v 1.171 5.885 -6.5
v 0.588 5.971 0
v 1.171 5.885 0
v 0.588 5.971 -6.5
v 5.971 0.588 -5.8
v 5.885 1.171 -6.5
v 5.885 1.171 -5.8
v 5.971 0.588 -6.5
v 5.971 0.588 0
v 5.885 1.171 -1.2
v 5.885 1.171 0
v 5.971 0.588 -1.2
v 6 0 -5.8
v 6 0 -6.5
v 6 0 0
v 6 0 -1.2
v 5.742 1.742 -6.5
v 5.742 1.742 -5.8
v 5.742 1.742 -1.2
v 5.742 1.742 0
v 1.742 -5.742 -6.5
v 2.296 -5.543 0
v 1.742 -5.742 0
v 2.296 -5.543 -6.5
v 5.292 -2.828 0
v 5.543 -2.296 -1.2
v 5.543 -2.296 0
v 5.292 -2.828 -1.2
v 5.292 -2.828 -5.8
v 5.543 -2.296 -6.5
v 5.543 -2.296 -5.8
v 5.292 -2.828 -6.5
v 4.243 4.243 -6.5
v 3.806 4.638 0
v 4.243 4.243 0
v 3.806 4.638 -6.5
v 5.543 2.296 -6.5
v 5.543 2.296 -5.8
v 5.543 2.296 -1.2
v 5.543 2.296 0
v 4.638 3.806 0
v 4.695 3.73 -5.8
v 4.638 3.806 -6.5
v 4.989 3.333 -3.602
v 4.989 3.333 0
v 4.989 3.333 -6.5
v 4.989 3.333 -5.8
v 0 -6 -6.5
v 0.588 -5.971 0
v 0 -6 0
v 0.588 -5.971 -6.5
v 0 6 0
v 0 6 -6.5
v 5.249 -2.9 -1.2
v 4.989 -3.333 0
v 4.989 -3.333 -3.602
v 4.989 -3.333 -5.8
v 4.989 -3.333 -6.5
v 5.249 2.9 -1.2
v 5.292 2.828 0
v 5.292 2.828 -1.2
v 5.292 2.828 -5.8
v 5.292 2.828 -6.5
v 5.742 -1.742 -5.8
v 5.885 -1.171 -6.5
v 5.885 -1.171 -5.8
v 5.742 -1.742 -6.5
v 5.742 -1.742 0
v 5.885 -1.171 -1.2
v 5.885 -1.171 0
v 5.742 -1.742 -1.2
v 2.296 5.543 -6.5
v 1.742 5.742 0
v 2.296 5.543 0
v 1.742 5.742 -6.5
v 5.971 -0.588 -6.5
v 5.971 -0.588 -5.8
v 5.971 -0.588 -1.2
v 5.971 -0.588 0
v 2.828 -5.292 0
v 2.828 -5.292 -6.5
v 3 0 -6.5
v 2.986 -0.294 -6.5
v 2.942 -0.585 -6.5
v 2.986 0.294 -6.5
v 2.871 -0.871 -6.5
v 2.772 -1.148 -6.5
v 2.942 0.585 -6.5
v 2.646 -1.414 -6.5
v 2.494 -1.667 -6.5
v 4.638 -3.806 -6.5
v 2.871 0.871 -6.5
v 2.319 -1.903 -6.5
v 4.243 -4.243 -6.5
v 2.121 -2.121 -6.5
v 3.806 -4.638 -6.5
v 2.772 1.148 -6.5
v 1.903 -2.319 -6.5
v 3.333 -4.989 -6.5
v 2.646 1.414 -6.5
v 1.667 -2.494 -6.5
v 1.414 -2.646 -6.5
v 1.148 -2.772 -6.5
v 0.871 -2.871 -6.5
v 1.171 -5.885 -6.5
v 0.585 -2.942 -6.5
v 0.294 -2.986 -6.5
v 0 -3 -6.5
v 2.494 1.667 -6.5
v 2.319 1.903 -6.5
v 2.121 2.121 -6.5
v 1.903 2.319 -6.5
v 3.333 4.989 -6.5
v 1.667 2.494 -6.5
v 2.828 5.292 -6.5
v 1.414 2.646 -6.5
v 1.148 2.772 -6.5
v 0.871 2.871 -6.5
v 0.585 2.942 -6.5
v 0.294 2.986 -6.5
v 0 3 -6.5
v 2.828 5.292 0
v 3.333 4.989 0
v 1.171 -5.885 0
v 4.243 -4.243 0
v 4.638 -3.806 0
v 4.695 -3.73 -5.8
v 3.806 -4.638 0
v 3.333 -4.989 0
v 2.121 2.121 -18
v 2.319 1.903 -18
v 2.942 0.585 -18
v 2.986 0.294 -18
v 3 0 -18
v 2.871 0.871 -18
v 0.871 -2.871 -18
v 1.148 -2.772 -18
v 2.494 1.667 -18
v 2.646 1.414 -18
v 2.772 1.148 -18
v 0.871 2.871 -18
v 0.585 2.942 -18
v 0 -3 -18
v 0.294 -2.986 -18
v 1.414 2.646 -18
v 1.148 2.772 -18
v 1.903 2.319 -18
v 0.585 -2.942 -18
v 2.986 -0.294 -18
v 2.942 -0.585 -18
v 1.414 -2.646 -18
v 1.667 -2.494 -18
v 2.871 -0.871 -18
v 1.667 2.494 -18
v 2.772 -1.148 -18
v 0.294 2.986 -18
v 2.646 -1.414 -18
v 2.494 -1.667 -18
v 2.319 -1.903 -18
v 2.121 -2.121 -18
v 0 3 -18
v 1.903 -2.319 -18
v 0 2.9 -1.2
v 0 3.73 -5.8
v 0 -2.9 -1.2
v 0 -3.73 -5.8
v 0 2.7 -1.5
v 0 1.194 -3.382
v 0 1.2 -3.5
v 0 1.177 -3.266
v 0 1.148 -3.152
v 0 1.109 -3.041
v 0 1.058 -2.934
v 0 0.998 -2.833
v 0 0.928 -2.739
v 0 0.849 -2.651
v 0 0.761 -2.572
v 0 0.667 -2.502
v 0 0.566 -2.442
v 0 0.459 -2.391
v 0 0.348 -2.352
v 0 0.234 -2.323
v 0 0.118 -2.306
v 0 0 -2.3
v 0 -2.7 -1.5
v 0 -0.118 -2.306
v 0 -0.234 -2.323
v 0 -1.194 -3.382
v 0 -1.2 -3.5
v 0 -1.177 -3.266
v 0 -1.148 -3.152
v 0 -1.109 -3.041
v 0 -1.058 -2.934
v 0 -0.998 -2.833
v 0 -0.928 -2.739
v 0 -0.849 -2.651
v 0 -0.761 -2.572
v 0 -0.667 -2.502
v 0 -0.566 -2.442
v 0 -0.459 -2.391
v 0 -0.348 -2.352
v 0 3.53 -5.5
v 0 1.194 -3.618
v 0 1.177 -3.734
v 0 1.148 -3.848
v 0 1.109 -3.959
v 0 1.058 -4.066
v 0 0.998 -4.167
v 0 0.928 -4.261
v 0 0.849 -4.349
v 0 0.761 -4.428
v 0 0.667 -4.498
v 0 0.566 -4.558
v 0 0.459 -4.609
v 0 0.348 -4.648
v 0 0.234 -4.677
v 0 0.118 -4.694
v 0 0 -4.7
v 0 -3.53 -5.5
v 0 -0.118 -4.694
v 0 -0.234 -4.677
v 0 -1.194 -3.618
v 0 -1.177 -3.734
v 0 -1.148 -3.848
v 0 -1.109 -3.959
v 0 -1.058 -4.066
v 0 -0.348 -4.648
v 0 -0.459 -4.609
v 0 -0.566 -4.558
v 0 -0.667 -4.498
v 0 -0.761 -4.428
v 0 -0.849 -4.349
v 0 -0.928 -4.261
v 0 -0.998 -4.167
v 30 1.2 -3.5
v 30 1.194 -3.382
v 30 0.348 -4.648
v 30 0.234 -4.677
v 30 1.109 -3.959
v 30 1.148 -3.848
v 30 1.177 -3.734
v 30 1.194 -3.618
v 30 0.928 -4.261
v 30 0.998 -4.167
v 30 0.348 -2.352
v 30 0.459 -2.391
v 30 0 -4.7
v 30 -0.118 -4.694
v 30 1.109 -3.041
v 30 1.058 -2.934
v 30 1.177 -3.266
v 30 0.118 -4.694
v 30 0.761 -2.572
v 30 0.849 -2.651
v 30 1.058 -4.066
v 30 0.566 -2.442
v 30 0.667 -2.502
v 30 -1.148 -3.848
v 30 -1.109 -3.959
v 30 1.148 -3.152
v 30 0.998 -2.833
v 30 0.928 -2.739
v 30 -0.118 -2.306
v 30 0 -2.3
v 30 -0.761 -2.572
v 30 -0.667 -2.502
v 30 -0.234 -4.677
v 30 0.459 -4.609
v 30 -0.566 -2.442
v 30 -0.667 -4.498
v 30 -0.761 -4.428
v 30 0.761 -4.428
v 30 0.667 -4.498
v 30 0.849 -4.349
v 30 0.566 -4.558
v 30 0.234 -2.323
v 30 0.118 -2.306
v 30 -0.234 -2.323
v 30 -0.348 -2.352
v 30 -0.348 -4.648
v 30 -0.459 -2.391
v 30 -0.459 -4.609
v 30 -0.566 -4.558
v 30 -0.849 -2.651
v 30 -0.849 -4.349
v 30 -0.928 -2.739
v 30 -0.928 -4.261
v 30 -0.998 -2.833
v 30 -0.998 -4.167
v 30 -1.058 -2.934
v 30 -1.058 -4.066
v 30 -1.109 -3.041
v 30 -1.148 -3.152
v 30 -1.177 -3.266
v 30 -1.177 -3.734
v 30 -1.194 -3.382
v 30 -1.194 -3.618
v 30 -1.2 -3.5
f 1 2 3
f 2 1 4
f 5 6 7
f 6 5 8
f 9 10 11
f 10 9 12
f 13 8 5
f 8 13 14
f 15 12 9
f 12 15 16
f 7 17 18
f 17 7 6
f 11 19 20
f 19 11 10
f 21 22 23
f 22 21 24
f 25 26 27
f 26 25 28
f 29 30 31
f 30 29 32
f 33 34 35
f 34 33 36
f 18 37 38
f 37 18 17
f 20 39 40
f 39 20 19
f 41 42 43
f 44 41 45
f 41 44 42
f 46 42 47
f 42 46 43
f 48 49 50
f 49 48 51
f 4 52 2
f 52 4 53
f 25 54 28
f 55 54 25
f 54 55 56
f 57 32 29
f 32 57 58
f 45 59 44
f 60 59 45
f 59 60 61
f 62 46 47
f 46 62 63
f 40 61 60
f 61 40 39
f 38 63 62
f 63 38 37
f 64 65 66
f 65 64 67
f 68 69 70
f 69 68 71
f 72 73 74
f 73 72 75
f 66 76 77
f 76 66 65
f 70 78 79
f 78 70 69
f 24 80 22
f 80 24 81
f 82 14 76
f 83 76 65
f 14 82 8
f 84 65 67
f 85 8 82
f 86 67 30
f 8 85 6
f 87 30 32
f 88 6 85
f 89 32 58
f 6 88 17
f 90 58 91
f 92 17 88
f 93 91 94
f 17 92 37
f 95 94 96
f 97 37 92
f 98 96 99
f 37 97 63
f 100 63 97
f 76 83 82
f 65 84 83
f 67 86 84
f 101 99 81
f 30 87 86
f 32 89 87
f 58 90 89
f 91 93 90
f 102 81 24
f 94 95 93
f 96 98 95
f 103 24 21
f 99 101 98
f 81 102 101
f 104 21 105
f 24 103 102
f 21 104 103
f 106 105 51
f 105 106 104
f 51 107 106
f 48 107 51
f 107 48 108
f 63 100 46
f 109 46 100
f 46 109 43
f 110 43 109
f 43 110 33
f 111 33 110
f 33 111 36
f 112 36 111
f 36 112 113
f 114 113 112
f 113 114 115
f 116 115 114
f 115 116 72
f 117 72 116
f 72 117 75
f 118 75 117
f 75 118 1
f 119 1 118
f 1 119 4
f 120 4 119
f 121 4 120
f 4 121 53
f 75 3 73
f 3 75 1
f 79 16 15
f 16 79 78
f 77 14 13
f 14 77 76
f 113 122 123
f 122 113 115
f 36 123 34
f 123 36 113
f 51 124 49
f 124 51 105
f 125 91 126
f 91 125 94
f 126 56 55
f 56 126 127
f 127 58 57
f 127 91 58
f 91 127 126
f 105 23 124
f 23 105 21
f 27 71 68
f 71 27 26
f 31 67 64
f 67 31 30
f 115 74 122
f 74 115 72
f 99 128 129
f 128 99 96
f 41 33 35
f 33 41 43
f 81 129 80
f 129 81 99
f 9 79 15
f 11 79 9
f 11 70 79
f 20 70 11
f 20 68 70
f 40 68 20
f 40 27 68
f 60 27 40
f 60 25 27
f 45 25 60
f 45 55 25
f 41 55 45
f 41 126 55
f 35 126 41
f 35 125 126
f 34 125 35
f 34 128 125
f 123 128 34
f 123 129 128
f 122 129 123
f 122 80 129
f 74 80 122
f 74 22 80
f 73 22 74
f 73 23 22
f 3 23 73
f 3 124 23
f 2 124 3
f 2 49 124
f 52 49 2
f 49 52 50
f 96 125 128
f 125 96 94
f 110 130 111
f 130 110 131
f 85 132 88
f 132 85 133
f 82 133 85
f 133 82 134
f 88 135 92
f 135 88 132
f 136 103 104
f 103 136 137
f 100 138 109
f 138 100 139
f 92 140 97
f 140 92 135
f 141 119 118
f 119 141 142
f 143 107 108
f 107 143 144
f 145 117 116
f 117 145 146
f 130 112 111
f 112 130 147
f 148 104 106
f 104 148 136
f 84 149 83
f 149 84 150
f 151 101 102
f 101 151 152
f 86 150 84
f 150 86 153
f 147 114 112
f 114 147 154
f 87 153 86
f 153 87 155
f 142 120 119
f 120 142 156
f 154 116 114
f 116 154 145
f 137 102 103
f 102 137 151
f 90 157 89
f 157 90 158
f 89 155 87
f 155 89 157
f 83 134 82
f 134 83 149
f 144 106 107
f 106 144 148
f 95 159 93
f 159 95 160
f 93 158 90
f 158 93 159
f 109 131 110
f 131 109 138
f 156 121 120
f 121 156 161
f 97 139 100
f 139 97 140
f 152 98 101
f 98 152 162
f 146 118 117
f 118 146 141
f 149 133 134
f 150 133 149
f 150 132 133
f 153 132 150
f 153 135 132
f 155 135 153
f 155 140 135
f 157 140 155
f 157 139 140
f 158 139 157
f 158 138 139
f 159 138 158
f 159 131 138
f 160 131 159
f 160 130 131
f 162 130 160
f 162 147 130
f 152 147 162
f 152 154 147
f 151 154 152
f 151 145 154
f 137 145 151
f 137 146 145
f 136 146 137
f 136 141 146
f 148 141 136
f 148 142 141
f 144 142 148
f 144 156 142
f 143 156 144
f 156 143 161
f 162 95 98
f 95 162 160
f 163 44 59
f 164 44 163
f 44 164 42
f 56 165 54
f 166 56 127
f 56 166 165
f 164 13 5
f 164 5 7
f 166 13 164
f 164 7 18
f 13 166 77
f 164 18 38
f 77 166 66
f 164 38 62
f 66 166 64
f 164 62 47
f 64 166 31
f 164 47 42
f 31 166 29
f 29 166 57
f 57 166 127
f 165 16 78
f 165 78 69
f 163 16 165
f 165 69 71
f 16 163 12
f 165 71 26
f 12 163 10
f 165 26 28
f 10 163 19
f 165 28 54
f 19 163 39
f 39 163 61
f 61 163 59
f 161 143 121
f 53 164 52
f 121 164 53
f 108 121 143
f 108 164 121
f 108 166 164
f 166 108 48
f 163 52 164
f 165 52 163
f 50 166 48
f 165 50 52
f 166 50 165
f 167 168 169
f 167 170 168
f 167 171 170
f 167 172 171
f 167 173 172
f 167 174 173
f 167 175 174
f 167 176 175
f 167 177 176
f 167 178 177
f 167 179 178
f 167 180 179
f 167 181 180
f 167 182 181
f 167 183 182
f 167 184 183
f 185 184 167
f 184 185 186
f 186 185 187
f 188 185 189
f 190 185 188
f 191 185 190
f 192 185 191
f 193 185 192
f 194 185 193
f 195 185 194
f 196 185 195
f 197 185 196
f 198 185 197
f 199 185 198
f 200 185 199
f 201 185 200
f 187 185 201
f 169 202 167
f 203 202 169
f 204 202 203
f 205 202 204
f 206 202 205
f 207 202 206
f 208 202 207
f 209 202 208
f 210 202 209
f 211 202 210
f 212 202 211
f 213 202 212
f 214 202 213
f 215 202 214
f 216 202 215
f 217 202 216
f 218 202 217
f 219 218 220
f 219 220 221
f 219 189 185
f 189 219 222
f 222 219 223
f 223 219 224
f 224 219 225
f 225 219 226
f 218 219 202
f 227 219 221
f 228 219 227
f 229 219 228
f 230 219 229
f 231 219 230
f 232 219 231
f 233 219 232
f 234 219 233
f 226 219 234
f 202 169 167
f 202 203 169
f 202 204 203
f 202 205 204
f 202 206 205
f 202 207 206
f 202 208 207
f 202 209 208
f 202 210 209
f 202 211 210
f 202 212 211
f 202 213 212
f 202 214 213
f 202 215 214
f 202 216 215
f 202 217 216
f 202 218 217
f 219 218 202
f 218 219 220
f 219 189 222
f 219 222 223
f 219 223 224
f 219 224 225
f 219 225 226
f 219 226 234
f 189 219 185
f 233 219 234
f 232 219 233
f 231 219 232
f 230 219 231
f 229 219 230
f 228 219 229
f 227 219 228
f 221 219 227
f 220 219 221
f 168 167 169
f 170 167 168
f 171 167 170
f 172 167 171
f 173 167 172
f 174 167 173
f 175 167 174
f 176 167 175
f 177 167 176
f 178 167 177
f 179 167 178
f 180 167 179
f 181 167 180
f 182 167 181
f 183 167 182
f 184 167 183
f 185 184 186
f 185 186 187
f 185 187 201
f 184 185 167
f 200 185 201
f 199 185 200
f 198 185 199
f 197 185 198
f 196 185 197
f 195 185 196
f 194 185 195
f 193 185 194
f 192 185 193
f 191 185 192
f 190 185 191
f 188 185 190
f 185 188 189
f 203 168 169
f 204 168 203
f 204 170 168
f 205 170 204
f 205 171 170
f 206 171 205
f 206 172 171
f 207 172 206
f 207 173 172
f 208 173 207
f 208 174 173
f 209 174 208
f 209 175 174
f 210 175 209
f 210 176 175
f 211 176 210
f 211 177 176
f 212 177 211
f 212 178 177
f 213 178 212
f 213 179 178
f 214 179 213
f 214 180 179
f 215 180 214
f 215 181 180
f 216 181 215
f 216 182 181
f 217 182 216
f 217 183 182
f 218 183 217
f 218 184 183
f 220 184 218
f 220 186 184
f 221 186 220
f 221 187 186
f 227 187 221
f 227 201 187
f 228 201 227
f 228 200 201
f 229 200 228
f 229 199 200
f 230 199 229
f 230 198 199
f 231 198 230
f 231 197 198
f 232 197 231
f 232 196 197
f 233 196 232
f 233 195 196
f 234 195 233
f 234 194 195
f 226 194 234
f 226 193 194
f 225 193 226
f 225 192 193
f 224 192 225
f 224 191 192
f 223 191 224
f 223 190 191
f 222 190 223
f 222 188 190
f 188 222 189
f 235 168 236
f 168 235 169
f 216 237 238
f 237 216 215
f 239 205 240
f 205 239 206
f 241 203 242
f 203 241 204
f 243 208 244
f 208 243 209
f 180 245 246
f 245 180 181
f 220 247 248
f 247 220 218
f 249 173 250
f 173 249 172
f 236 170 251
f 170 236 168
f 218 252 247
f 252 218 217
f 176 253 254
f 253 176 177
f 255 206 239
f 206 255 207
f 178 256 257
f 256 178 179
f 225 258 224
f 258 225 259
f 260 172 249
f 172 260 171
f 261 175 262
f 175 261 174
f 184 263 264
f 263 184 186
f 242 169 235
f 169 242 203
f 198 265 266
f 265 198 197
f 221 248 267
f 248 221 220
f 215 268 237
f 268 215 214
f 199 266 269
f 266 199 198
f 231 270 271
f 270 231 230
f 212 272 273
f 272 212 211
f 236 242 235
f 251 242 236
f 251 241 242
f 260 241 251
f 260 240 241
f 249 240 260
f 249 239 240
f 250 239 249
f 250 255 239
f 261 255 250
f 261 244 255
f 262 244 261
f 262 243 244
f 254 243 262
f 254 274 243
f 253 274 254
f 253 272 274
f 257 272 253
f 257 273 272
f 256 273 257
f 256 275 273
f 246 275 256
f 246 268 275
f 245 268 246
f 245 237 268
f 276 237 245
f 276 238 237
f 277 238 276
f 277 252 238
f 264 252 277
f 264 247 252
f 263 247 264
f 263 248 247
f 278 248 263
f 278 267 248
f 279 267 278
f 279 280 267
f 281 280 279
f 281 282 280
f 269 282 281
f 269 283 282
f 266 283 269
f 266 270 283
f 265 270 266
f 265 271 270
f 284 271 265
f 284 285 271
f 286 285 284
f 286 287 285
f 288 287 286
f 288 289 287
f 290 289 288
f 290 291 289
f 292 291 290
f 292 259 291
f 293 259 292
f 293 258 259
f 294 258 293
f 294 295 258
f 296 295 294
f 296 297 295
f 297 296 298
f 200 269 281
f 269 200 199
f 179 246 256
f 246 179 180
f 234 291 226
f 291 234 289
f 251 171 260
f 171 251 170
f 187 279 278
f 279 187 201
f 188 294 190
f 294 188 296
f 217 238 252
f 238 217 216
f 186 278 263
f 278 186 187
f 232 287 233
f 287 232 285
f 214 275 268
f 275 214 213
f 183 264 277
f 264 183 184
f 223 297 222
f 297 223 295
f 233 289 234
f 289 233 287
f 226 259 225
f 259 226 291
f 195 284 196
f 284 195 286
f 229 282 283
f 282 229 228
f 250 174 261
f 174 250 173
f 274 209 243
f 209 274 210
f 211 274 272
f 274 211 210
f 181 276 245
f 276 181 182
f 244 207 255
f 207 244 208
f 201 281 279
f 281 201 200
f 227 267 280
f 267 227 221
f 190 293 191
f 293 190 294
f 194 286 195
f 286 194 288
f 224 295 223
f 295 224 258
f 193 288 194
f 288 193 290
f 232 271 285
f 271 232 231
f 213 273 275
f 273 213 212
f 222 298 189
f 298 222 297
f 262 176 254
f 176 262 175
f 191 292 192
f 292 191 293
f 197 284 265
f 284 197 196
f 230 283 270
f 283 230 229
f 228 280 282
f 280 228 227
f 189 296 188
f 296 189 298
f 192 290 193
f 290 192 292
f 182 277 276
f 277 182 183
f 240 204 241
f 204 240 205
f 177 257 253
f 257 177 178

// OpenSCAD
// file: B_dovetail.scad
// =============================================================================
// Design B — Co-printed dovetail / T-slot mechanical interlock (PRIMARY)
// =============================================================================
// PETG strut tip ends in a captive dovetail / T-slot socket; the TPU cable is
// terminated in a matching dovetail / T-head co-printed inside the socket.
// Per Edison Phase-3 ANALYSIS 19e0c868 §2 (CAD review) geometry, which
// supersedes the earlier ce84ddf8 §4 numbers:
//   - Node OD:                 12.0 mm (was 9.0; needed for >=2 perimeters
//                                       on the lateral PETG cheeks)
//   - Slot mouth width:         5.4 mm (allows solid bridging over the gap)
//   - TPU head width (undercut):7.06 mm (≈0.83 mm undercut per side)
//   - Slot internal height:     4.0 mm
//   - Slot depth (along strut): 6.0 mm (>=4-6 mm engagement plateau, Wang 2026)
//   - Dovetail flank angle:    22.5° (Wang 2026 shear-strength optimum for
//                                     bi-material FDM rigid-flexible interlock)
//   - Lateral (Y) clearance:    0.20 mm per face (load-bearing fit, Ermolai 2024)
//   - Roof (Z) clearance:       0.30 mm (bridge sag tolerance, Ermolai 2024)
//   - +X exit fillet:           0.5 mm (de-notches TPU cable redirection,
//                                       Frascio 2024)
// Strut runs along +Z; cable exits along +X. The PETG cap above the head
// (the "roof") is the print-in-place bridge that captures the TPU dovetail.
// =============================================================================
include <_common.scad>

slot_mouth   = 5.4;
slot_inner   = 7.06;
slot_height  = 4.0;
slot_depth   = 6.0;       // along strut axis (Z)
flank_deg    = 22.5;      // half-flank, measured from vertical wall
clear_lat    = 0.20;      // lateral (Y, load-bearing) running clearance per face
clear_roof   = 0.30;      // roof (Z) clearance per face — bridge-sag tolerance
mouth_fillet = 0.5;       // PETG slot-mouth +X exit fillet (TPU de-notch)
node_d       = 12.0;      // PETG socket outer diameter near tip

// Dovetail / T-head extruded along +X (X = depth into slot).
// The cross-section in (Y,Z) is wider at the bottom (slot_inner) than the
// top (slot_mouth) — that is the "captive" undercut.
module dovetail_xs(width_top, width_bot, height) {
    polygon(points = [
        [-width_top/2,  height/2],
        [ width_top/2,  height/2],
        [ width_bot/2, -height/2],
        [-width_bot/2, -height/2],
    ]);
}

module designB_petg() {
    difference() {
        union() {
            translate([0, 0, -slot_depth - 0.5])
                cylinder(h=slot_depth + 0.5, d=node_d);
            translate([0, 0, -strut_l])
                cylinder(h=strut_l - slot_depth, d=strut_d);
        }
        // Dovetail pocket — wide at the bottom (captive). Differential clearance:
        // tight on the lateral (Y) load-bearing flanks (`clear_lat`), looser on
        // the roof (Z) for bridge-sag tolerance (`clear_roof`).
        translate([-(node_d/2 + 0.1), 0, -slot_depth/2 - 0.5])
            rotate([90, 0, 90])
                linear_extrude(height = node_d + 0.2 + clear_lat)
                    dovetail_xs(slot_mouth + 2*clear_lat,
                                slot_inner + 2*clear_lat,
                                slot_height + 2*clear_roof);
    }
}

module designB_tpu() {
    // Head: dovetail cross-section extruded along the slot depth (the -X half of
    // the through-slot, x ∈ [-node_d/2, -node_d/2 + slot_depth] = [-6, 0]).
    translate([-node_d/2, 0, -slot_depth/2 - 0.5])
        rotate([90, 0, 90])
            linear_extrude(height = slot_depth)
                dovetail_xs(slot_mouth, slot_inner, slot_height);
    // Cable exits the +X face of the node along the slot centerline (Z = head
    // center, NOT z=0). Starts at x=0 (the +X face of the head) so the cable
    // is mechanically continuous with the dovetail head and emerges through
    // the slot mouth on the +X face of the PETG node.
    translate([0, 0, -slot_depth/2 - 0.5]) rotate([0, 90, 0])
        cylinder(h=cable_l, d=cable_d);
}

module designB() {
    petg() designB_petg();
    tpu()  designB_tpu();
}

designB();
// file: _common.scad
// Shared parameters for the five candidate PETG-strut + TPU-cable joint
// designs explored in `edison-trajectories/joint-design/`.
//
// Coordinate convention (per design): the PETG strut runs along +Z and the
// TPU cable runs along the global +X direction (so the joint plane is the
// X-Z plane). All units in mm. PETG is rendered orange, TPU dark cyan.
strut_d = 6.0;     // PETG strut diameter (matches t3-prism.scad)
cable_d = 2.4;     // TPU cable diameter (matches t3-prism.scad)
strut_l = 18.0;    // visible strut length to render
cable_l = 30.0;    // visible cable length on each side
$fn = 64;

PETG_RGB = [0.95, 0.55, 0.20];
TPU_RGB  = [0.10, 0.55, 0.55];

module petg() { color(PETG_RGB) children(); }
module tpu()  { color(TPU_RGB)  children(); }

// Strut as a vertical capsule along +Z, tip at z = 0, body extending to -strut_l.
module strut_body(length = strut_l, d = strut_d) {
    translate([0, 0, -length]) cylinder(h=length, d=d);
    sphere(d=d);
}

// Straight TPU cable along +X.
module cable_segment(length = cable_l, d = cable_d, x0 = 0) {
    translate([x0, 0, 0])
        rotate([0, 90, 0])
            cylinder(h=length, d=d);
}
// main file
// Section view of Design B — cut at the X=0 plane, keep +X half (cut at X=0).
// Apply intersection per-color part so PETG/TPU colors survive the CSG.
include <_common.scad>
use <B_dovetail.scad>

module half_cube_X() { translate([0, -30, -40]) cube([60, 60, 60]); }

petg() intersection() { designB_petg(); half_cube_X(); }
tpu()  intersection() { designB_tpu();  half_cube_X(); }
